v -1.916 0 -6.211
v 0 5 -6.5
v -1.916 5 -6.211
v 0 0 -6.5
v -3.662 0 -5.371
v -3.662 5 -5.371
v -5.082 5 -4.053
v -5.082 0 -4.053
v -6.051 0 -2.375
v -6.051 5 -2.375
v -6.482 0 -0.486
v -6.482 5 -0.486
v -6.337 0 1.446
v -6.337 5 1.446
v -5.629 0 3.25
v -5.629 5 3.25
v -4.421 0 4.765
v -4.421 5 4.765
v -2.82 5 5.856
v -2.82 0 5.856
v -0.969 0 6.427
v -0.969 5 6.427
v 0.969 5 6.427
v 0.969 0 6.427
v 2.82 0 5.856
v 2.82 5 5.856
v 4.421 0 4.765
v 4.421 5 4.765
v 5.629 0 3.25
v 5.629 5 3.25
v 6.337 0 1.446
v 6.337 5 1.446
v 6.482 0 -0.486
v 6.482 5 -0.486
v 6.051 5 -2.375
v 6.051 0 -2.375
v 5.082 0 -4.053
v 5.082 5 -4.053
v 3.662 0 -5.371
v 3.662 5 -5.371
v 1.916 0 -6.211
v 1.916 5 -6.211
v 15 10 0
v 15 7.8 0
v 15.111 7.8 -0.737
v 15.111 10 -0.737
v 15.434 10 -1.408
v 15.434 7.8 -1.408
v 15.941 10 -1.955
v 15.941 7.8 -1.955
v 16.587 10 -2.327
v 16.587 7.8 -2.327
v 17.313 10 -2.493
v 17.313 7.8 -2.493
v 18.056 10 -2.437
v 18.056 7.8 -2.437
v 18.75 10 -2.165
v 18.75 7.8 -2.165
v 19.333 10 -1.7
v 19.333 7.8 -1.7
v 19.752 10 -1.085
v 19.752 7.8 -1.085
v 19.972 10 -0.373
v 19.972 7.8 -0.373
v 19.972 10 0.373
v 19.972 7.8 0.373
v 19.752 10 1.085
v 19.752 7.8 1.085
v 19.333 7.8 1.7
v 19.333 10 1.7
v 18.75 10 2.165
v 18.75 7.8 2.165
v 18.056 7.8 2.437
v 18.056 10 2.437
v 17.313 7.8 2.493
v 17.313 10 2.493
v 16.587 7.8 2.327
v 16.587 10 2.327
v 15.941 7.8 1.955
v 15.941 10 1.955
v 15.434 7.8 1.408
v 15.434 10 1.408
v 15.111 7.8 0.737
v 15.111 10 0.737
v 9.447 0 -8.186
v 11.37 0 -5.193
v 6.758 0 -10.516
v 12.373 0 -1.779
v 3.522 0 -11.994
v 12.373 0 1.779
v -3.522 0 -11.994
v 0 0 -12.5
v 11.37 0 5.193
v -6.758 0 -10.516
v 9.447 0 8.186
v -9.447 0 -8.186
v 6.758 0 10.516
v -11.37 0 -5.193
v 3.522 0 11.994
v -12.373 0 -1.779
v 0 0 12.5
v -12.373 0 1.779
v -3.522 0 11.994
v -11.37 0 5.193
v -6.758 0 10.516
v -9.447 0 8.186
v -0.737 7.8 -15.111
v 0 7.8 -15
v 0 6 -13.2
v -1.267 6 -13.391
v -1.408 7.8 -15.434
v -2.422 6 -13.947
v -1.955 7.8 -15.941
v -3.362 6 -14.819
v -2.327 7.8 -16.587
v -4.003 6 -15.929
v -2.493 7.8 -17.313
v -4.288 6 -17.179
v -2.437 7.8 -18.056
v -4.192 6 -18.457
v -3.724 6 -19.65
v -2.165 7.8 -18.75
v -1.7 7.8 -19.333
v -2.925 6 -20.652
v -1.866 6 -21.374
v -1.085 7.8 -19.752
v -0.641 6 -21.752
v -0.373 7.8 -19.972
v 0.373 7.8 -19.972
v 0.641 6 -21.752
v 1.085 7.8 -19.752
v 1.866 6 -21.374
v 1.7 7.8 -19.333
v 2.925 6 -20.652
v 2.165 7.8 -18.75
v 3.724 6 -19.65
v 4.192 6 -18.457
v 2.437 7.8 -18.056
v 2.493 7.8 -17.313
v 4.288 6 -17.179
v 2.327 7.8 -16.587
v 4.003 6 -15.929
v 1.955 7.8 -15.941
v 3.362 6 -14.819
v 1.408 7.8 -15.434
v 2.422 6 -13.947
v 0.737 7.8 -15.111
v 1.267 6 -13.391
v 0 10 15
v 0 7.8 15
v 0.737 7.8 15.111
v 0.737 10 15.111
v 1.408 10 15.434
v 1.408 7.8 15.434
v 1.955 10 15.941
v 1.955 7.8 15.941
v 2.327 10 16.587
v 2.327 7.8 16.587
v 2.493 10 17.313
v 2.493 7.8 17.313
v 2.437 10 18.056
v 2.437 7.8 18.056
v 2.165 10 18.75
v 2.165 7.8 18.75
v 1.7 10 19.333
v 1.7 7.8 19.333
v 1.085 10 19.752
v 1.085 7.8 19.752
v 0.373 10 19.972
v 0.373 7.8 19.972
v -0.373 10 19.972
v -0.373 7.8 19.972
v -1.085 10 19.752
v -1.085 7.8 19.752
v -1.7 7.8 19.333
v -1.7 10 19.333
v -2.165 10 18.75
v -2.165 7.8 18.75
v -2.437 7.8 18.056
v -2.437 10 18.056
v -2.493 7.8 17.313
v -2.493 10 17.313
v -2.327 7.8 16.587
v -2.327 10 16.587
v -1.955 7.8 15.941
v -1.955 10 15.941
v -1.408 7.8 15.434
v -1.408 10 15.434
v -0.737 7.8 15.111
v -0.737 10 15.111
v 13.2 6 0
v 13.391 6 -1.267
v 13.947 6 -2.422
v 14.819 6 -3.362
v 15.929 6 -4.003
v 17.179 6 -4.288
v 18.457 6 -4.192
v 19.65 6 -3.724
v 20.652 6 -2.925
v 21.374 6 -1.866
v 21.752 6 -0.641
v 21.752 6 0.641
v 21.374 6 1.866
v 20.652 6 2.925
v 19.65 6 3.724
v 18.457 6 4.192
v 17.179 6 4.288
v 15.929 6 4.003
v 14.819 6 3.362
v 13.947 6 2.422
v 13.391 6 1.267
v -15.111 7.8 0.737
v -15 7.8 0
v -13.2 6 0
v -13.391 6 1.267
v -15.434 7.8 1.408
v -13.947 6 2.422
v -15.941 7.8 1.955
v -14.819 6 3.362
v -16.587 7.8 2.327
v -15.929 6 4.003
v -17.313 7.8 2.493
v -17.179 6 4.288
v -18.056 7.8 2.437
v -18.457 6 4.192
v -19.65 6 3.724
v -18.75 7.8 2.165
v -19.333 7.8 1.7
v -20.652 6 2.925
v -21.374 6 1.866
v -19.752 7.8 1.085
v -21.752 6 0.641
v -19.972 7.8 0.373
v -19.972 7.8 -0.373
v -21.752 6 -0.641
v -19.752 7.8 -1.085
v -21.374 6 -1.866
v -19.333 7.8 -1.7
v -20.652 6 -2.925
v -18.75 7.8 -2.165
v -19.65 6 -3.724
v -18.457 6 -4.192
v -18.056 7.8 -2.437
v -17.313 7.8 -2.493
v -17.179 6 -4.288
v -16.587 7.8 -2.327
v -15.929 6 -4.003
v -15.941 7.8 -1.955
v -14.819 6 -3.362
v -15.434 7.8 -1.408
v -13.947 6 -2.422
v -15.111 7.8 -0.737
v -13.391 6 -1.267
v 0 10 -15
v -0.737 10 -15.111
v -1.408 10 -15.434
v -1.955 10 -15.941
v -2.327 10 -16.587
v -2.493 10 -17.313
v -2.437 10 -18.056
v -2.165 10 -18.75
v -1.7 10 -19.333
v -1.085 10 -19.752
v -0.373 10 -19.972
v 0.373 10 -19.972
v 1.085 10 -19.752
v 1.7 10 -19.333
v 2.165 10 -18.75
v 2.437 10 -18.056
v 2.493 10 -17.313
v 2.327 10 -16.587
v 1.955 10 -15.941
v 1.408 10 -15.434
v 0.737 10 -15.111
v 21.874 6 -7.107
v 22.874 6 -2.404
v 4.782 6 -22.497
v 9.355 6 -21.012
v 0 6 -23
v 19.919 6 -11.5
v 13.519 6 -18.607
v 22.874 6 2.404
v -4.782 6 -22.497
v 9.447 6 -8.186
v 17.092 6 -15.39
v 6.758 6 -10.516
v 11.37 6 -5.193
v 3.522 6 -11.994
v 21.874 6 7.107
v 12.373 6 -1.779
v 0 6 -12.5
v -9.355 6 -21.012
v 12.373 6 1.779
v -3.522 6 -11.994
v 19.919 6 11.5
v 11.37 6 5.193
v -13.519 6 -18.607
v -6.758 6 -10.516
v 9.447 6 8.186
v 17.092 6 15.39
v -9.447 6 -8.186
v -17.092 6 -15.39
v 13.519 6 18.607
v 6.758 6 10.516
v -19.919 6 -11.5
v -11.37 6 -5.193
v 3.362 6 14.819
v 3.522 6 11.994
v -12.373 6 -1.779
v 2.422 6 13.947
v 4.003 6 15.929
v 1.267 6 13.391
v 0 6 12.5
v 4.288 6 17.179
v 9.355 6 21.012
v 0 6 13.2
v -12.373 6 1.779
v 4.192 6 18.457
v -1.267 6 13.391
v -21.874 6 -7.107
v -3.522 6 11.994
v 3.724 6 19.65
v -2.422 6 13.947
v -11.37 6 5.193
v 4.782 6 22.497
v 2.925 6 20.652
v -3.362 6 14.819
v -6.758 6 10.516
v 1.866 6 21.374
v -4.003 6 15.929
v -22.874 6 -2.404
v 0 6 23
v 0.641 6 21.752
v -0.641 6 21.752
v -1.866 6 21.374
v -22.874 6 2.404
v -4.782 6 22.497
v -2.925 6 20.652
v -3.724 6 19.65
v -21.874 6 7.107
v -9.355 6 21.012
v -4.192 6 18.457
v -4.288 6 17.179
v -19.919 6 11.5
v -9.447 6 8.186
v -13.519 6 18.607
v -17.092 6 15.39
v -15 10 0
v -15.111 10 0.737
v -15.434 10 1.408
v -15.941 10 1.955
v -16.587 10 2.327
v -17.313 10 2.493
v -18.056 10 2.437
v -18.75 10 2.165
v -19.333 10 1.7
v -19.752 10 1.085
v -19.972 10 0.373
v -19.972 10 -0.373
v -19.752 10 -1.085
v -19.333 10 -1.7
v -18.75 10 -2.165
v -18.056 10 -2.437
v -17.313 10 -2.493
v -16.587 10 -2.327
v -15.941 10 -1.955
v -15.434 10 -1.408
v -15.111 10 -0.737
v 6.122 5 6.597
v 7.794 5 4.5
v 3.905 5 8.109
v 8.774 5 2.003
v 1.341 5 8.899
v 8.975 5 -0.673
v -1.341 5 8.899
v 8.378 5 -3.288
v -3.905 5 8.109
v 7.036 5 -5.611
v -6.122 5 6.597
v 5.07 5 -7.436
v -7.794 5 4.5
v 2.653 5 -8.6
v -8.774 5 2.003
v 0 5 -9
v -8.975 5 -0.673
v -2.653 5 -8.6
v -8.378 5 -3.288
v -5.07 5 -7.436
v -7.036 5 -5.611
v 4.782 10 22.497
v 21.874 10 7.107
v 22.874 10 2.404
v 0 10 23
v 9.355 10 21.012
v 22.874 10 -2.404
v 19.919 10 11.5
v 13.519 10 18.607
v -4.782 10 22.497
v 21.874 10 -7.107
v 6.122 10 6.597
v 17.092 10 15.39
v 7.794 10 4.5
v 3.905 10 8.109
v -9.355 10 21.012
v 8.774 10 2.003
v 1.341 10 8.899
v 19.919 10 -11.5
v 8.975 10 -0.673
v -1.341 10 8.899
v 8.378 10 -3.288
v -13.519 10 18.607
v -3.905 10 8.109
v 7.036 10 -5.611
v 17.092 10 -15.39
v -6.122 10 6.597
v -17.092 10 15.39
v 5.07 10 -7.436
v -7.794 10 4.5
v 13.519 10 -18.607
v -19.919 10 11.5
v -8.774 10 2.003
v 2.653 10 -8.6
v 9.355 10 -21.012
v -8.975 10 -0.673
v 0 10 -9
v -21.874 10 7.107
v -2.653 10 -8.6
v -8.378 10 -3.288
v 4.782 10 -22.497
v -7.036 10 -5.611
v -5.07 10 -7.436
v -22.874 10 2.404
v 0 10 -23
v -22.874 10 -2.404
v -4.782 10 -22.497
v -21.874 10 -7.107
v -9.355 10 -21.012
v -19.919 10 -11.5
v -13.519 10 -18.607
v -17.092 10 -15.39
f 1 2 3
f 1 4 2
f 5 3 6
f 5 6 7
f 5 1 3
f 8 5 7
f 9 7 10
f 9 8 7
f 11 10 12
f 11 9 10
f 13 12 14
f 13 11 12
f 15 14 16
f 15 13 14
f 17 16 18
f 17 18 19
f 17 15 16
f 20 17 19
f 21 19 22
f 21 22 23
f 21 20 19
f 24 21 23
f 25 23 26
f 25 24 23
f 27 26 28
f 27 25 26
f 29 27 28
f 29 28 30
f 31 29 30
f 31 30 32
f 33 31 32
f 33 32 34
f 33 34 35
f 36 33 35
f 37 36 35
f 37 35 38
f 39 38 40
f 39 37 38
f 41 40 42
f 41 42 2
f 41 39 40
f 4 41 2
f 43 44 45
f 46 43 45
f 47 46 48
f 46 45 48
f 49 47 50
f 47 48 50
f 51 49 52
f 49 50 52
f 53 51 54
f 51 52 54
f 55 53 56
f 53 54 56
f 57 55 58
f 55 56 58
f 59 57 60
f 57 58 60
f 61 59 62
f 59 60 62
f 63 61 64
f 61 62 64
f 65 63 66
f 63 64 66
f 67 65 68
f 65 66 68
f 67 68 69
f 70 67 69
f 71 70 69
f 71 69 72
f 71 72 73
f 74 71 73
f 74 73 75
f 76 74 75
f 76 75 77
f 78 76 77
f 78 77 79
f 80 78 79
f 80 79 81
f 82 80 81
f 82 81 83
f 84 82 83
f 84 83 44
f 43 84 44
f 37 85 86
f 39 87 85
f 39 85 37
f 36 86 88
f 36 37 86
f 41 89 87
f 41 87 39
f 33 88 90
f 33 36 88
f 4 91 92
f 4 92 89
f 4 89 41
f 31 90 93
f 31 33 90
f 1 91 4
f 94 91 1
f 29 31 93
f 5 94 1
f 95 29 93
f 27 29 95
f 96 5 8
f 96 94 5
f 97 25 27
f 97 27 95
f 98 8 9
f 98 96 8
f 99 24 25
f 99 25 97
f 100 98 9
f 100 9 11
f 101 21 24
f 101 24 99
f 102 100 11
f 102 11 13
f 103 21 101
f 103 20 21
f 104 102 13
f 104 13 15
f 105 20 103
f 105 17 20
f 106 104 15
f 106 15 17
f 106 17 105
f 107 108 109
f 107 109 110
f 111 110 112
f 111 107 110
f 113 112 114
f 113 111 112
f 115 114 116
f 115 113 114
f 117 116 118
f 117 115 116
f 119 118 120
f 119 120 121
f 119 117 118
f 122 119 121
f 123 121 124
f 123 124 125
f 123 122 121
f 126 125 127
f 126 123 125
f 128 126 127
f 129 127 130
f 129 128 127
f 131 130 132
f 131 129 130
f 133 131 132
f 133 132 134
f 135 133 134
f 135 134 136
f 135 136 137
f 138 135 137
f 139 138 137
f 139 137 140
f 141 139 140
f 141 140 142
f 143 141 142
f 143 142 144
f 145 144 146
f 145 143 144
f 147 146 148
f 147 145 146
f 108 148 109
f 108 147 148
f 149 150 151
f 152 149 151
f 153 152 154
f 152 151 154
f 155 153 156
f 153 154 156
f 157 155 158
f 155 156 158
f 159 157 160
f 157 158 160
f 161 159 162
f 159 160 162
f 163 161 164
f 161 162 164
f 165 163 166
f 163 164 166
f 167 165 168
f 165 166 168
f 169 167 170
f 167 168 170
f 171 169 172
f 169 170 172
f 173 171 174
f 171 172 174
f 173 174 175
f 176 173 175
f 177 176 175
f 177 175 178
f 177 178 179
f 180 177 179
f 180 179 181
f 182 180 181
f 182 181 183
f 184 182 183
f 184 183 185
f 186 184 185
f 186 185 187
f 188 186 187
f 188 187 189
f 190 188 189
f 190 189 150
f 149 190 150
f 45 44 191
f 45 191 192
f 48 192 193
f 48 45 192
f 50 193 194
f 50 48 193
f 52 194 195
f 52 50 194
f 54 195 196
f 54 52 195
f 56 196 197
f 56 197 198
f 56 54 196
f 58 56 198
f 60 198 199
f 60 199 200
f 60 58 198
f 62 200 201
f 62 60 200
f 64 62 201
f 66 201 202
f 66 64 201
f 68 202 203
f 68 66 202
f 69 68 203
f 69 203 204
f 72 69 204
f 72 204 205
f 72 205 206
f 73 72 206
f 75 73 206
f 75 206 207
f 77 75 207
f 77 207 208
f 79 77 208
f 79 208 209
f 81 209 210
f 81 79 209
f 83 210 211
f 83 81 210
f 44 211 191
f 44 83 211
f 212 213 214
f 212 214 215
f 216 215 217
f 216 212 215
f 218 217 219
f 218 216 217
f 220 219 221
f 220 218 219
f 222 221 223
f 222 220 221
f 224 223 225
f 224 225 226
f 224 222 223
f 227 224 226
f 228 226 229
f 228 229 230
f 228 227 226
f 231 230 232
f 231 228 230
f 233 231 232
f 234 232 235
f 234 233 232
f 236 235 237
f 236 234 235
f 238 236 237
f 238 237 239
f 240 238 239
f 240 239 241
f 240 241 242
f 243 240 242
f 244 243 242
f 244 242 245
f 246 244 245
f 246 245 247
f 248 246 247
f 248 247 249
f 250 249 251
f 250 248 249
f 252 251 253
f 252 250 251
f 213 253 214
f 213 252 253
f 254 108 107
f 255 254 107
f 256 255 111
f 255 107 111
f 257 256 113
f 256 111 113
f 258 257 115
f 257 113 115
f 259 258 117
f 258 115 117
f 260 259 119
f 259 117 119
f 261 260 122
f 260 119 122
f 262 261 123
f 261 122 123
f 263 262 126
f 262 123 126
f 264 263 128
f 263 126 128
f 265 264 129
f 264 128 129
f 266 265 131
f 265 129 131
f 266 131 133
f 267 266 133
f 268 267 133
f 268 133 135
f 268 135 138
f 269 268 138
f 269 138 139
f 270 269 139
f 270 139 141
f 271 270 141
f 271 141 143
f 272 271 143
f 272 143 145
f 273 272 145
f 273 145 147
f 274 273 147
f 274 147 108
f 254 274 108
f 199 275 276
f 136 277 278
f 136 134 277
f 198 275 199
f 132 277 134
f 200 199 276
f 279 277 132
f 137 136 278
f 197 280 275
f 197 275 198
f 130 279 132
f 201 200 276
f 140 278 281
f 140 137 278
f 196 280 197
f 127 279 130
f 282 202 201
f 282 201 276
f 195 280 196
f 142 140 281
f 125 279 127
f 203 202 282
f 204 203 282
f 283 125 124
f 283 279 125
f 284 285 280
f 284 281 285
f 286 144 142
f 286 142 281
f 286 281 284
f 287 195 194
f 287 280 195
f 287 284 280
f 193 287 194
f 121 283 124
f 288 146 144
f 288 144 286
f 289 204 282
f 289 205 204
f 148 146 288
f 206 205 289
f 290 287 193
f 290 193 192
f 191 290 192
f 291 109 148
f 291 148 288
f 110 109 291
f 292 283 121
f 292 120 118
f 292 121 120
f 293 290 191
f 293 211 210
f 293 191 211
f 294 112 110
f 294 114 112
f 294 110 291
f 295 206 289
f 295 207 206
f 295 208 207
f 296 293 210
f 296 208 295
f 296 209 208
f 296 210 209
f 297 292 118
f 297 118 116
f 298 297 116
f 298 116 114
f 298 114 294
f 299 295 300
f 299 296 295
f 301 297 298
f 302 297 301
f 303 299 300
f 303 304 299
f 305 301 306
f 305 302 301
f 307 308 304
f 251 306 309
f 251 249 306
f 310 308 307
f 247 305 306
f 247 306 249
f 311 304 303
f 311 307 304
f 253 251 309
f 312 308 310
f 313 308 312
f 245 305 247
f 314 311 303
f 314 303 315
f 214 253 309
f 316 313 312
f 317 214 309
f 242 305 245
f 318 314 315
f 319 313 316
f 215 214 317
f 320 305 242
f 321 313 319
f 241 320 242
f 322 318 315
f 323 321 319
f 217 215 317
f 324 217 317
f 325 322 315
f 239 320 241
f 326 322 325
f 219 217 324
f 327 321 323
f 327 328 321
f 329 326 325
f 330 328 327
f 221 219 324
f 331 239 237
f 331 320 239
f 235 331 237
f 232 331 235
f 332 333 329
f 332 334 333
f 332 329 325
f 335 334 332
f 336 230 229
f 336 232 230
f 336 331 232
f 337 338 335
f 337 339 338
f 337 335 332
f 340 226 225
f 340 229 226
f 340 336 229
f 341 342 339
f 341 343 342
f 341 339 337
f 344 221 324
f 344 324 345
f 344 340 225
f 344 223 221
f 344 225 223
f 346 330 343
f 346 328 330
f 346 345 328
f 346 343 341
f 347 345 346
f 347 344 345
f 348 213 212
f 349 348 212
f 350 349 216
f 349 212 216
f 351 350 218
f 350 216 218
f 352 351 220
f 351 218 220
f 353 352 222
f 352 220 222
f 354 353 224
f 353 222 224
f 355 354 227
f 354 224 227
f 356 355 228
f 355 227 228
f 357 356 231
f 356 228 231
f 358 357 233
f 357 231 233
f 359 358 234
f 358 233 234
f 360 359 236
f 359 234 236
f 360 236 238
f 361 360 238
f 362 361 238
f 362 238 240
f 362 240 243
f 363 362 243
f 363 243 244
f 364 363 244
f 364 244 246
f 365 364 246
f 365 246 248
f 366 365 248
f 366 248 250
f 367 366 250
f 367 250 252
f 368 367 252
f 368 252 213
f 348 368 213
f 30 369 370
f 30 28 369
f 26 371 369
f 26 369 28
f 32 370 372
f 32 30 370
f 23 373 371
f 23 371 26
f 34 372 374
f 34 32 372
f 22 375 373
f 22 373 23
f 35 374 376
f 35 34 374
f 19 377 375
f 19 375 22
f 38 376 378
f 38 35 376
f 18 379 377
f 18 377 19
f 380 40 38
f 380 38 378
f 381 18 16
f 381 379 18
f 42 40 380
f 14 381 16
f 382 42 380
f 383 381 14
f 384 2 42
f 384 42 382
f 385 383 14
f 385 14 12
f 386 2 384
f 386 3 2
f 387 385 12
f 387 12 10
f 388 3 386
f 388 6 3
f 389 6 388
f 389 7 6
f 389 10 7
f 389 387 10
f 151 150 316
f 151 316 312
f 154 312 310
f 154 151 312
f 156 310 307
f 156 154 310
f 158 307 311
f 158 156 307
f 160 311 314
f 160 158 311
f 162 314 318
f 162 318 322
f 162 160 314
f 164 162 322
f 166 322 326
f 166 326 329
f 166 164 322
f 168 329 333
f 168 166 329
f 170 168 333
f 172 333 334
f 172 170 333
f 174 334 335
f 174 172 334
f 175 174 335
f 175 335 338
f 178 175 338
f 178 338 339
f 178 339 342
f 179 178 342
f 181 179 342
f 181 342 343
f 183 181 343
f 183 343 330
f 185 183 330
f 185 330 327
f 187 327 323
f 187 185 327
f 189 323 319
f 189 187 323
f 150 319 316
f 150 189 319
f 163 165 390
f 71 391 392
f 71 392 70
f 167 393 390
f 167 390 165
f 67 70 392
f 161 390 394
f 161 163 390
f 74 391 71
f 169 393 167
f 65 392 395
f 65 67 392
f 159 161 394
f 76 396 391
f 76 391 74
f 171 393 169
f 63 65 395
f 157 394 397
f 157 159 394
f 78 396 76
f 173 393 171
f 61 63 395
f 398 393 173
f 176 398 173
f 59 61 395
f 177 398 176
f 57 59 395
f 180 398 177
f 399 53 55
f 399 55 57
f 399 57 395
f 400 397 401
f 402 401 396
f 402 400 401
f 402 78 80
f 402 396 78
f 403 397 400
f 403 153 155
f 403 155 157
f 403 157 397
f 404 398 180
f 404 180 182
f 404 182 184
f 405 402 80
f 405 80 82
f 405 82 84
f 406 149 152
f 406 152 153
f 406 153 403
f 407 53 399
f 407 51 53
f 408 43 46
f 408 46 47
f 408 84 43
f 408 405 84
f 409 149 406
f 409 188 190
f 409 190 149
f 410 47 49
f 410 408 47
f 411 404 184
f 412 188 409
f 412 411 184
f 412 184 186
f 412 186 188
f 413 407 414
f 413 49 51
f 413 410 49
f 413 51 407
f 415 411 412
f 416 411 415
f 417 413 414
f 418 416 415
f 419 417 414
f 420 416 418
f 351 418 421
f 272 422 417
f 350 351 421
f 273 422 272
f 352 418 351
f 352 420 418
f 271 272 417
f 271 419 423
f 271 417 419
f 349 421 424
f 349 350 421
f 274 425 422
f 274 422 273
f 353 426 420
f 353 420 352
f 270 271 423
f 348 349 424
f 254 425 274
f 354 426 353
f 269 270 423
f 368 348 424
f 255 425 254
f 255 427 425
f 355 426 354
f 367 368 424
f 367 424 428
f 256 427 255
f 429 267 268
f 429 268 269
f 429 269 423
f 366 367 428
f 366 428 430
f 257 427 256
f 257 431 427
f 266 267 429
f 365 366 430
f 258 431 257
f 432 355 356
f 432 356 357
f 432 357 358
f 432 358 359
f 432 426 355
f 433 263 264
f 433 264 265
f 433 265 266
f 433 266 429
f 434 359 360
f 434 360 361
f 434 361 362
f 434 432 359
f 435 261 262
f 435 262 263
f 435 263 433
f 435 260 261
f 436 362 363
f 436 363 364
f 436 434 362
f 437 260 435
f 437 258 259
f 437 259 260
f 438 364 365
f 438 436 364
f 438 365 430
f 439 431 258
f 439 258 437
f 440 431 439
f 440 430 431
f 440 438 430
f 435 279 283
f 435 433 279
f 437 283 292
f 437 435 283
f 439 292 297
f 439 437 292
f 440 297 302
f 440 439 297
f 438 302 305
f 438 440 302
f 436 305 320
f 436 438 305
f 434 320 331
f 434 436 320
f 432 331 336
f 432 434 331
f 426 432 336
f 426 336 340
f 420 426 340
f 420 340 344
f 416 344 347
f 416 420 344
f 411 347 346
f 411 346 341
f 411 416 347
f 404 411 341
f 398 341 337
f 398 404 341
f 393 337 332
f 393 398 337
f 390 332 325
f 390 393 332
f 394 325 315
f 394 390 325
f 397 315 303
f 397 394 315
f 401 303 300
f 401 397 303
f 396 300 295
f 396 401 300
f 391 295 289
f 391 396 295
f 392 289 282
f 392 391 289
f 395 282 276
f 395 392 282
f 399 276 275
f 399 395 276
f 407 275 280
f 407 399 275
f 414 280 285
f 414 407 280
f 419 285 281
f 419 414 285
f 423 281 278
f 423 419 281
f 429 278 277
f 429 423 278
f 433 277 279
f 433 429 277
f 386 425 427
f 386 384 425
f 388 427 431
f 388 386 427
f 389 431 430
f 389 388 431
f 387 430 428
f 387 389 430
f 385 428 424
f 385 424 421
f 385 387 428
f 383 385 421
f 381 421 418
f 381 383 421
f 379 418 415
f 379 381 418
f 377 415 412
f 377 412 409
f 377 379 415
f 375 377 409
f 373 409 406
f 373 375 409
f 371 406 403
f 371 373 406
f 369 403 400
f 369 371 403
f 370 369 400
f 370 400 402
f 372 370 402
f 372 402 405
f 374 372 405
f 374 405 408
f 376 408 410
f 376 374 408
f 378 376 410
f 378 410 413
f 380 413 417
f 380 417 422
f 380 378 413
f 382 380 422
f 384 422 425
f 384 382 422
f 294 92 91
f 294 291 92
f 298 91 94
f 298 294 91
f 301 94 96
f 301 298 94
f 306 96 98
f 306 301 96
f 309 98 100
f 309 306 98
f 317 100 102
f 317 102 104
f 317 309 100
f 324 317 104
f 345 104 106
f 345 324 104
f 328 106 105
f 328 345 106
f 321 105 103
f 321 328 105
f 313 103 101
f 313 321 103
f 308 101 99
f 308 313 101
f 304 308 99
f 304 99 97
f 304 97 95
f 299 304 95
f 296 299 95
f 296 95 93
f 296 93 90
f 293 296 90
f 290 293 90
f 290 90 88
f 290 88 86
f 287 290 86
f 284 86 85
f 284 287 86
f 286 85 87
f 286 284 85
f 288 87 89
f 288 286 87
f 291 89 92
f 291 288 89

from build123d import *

# Parameters (mm, degrees)
FORO_5_0_5_1_D                        = 5
SMUSSO1_SIZE                          = 1.8
RIPETIZIONECIRCOLARE1_COUNT           = 4
SMUSSO1_OF_RIPETIZIONECIRCOLARE1_SIZE = 1.8


with BuildPart() as part:
    # Schizzo1 → Rivoluzione1 (revolve)
    with BuildSketch(Plane.XY, mode=Mode.PRIVATE) as rivoluzione1_sk:
        Polygon((6.5, 0), (12.5, 0), (12.5, 6), (23, 6), (23, 10), (9, 10), (9, 5), (6.5, 5), align=None)
    revolve(rivoluzione1_sk.sketch.rotate(Axis((0, 0, 0), (0, 1, 0)), 90), axis=Axis((0, 0, 0), (0, 1, 0)))

    # Foro Ø5.0 (5)-1 (through all)
    with Locations(Plane(origin=(0, 10, 0), x_dir=(1, 0, 0), z_dir=(0, 1, 0))):
        with Locations((17.5, 0)):
            foro_5_0_5_1 = Hole(FORO_5_0_5_1_D / 2)

    # Smusso1
    smusso1_edges = [part.edges().sort_by_distance(p)[0] for p in [
        (20, 6, 0),
    ]]
    chamfer(smusso1_edges, length=SMUSSO1_SIZE)

    # RipetizioneCircolare1: Foro Ø5.0 (5)-1 ×4 about axis
    ripetizionecircolare1_axis = Axis((0, 0, 0), (0, 1, 0))
    for i in range(1, RIPETIZIONECIRCOLARE1_COUNT):
        add(foro_5_0_5_1.rotate(ripetizionecircolare1_axis, i * 360 / RIPETIZIONECIRCOLARE1_COUNT), mode=Mode.SUBTRACT)

    # Smusso1 of RipetizioneCircolare1
    smusso1_of_ripetizionecircolare1_edges = [part.edges().sort_by_distance(p)[0] for p in [
        (0, 6, -20),
        (-20, 6, 0),
        (0, 6, 20),
    ]]
    chamfer(smusso1_of_ripetizionecircolare1_edges, length=SMUSSO1_OF_RIPETIZIONECIRCOLARE1_SIZE)


solid = part.part
